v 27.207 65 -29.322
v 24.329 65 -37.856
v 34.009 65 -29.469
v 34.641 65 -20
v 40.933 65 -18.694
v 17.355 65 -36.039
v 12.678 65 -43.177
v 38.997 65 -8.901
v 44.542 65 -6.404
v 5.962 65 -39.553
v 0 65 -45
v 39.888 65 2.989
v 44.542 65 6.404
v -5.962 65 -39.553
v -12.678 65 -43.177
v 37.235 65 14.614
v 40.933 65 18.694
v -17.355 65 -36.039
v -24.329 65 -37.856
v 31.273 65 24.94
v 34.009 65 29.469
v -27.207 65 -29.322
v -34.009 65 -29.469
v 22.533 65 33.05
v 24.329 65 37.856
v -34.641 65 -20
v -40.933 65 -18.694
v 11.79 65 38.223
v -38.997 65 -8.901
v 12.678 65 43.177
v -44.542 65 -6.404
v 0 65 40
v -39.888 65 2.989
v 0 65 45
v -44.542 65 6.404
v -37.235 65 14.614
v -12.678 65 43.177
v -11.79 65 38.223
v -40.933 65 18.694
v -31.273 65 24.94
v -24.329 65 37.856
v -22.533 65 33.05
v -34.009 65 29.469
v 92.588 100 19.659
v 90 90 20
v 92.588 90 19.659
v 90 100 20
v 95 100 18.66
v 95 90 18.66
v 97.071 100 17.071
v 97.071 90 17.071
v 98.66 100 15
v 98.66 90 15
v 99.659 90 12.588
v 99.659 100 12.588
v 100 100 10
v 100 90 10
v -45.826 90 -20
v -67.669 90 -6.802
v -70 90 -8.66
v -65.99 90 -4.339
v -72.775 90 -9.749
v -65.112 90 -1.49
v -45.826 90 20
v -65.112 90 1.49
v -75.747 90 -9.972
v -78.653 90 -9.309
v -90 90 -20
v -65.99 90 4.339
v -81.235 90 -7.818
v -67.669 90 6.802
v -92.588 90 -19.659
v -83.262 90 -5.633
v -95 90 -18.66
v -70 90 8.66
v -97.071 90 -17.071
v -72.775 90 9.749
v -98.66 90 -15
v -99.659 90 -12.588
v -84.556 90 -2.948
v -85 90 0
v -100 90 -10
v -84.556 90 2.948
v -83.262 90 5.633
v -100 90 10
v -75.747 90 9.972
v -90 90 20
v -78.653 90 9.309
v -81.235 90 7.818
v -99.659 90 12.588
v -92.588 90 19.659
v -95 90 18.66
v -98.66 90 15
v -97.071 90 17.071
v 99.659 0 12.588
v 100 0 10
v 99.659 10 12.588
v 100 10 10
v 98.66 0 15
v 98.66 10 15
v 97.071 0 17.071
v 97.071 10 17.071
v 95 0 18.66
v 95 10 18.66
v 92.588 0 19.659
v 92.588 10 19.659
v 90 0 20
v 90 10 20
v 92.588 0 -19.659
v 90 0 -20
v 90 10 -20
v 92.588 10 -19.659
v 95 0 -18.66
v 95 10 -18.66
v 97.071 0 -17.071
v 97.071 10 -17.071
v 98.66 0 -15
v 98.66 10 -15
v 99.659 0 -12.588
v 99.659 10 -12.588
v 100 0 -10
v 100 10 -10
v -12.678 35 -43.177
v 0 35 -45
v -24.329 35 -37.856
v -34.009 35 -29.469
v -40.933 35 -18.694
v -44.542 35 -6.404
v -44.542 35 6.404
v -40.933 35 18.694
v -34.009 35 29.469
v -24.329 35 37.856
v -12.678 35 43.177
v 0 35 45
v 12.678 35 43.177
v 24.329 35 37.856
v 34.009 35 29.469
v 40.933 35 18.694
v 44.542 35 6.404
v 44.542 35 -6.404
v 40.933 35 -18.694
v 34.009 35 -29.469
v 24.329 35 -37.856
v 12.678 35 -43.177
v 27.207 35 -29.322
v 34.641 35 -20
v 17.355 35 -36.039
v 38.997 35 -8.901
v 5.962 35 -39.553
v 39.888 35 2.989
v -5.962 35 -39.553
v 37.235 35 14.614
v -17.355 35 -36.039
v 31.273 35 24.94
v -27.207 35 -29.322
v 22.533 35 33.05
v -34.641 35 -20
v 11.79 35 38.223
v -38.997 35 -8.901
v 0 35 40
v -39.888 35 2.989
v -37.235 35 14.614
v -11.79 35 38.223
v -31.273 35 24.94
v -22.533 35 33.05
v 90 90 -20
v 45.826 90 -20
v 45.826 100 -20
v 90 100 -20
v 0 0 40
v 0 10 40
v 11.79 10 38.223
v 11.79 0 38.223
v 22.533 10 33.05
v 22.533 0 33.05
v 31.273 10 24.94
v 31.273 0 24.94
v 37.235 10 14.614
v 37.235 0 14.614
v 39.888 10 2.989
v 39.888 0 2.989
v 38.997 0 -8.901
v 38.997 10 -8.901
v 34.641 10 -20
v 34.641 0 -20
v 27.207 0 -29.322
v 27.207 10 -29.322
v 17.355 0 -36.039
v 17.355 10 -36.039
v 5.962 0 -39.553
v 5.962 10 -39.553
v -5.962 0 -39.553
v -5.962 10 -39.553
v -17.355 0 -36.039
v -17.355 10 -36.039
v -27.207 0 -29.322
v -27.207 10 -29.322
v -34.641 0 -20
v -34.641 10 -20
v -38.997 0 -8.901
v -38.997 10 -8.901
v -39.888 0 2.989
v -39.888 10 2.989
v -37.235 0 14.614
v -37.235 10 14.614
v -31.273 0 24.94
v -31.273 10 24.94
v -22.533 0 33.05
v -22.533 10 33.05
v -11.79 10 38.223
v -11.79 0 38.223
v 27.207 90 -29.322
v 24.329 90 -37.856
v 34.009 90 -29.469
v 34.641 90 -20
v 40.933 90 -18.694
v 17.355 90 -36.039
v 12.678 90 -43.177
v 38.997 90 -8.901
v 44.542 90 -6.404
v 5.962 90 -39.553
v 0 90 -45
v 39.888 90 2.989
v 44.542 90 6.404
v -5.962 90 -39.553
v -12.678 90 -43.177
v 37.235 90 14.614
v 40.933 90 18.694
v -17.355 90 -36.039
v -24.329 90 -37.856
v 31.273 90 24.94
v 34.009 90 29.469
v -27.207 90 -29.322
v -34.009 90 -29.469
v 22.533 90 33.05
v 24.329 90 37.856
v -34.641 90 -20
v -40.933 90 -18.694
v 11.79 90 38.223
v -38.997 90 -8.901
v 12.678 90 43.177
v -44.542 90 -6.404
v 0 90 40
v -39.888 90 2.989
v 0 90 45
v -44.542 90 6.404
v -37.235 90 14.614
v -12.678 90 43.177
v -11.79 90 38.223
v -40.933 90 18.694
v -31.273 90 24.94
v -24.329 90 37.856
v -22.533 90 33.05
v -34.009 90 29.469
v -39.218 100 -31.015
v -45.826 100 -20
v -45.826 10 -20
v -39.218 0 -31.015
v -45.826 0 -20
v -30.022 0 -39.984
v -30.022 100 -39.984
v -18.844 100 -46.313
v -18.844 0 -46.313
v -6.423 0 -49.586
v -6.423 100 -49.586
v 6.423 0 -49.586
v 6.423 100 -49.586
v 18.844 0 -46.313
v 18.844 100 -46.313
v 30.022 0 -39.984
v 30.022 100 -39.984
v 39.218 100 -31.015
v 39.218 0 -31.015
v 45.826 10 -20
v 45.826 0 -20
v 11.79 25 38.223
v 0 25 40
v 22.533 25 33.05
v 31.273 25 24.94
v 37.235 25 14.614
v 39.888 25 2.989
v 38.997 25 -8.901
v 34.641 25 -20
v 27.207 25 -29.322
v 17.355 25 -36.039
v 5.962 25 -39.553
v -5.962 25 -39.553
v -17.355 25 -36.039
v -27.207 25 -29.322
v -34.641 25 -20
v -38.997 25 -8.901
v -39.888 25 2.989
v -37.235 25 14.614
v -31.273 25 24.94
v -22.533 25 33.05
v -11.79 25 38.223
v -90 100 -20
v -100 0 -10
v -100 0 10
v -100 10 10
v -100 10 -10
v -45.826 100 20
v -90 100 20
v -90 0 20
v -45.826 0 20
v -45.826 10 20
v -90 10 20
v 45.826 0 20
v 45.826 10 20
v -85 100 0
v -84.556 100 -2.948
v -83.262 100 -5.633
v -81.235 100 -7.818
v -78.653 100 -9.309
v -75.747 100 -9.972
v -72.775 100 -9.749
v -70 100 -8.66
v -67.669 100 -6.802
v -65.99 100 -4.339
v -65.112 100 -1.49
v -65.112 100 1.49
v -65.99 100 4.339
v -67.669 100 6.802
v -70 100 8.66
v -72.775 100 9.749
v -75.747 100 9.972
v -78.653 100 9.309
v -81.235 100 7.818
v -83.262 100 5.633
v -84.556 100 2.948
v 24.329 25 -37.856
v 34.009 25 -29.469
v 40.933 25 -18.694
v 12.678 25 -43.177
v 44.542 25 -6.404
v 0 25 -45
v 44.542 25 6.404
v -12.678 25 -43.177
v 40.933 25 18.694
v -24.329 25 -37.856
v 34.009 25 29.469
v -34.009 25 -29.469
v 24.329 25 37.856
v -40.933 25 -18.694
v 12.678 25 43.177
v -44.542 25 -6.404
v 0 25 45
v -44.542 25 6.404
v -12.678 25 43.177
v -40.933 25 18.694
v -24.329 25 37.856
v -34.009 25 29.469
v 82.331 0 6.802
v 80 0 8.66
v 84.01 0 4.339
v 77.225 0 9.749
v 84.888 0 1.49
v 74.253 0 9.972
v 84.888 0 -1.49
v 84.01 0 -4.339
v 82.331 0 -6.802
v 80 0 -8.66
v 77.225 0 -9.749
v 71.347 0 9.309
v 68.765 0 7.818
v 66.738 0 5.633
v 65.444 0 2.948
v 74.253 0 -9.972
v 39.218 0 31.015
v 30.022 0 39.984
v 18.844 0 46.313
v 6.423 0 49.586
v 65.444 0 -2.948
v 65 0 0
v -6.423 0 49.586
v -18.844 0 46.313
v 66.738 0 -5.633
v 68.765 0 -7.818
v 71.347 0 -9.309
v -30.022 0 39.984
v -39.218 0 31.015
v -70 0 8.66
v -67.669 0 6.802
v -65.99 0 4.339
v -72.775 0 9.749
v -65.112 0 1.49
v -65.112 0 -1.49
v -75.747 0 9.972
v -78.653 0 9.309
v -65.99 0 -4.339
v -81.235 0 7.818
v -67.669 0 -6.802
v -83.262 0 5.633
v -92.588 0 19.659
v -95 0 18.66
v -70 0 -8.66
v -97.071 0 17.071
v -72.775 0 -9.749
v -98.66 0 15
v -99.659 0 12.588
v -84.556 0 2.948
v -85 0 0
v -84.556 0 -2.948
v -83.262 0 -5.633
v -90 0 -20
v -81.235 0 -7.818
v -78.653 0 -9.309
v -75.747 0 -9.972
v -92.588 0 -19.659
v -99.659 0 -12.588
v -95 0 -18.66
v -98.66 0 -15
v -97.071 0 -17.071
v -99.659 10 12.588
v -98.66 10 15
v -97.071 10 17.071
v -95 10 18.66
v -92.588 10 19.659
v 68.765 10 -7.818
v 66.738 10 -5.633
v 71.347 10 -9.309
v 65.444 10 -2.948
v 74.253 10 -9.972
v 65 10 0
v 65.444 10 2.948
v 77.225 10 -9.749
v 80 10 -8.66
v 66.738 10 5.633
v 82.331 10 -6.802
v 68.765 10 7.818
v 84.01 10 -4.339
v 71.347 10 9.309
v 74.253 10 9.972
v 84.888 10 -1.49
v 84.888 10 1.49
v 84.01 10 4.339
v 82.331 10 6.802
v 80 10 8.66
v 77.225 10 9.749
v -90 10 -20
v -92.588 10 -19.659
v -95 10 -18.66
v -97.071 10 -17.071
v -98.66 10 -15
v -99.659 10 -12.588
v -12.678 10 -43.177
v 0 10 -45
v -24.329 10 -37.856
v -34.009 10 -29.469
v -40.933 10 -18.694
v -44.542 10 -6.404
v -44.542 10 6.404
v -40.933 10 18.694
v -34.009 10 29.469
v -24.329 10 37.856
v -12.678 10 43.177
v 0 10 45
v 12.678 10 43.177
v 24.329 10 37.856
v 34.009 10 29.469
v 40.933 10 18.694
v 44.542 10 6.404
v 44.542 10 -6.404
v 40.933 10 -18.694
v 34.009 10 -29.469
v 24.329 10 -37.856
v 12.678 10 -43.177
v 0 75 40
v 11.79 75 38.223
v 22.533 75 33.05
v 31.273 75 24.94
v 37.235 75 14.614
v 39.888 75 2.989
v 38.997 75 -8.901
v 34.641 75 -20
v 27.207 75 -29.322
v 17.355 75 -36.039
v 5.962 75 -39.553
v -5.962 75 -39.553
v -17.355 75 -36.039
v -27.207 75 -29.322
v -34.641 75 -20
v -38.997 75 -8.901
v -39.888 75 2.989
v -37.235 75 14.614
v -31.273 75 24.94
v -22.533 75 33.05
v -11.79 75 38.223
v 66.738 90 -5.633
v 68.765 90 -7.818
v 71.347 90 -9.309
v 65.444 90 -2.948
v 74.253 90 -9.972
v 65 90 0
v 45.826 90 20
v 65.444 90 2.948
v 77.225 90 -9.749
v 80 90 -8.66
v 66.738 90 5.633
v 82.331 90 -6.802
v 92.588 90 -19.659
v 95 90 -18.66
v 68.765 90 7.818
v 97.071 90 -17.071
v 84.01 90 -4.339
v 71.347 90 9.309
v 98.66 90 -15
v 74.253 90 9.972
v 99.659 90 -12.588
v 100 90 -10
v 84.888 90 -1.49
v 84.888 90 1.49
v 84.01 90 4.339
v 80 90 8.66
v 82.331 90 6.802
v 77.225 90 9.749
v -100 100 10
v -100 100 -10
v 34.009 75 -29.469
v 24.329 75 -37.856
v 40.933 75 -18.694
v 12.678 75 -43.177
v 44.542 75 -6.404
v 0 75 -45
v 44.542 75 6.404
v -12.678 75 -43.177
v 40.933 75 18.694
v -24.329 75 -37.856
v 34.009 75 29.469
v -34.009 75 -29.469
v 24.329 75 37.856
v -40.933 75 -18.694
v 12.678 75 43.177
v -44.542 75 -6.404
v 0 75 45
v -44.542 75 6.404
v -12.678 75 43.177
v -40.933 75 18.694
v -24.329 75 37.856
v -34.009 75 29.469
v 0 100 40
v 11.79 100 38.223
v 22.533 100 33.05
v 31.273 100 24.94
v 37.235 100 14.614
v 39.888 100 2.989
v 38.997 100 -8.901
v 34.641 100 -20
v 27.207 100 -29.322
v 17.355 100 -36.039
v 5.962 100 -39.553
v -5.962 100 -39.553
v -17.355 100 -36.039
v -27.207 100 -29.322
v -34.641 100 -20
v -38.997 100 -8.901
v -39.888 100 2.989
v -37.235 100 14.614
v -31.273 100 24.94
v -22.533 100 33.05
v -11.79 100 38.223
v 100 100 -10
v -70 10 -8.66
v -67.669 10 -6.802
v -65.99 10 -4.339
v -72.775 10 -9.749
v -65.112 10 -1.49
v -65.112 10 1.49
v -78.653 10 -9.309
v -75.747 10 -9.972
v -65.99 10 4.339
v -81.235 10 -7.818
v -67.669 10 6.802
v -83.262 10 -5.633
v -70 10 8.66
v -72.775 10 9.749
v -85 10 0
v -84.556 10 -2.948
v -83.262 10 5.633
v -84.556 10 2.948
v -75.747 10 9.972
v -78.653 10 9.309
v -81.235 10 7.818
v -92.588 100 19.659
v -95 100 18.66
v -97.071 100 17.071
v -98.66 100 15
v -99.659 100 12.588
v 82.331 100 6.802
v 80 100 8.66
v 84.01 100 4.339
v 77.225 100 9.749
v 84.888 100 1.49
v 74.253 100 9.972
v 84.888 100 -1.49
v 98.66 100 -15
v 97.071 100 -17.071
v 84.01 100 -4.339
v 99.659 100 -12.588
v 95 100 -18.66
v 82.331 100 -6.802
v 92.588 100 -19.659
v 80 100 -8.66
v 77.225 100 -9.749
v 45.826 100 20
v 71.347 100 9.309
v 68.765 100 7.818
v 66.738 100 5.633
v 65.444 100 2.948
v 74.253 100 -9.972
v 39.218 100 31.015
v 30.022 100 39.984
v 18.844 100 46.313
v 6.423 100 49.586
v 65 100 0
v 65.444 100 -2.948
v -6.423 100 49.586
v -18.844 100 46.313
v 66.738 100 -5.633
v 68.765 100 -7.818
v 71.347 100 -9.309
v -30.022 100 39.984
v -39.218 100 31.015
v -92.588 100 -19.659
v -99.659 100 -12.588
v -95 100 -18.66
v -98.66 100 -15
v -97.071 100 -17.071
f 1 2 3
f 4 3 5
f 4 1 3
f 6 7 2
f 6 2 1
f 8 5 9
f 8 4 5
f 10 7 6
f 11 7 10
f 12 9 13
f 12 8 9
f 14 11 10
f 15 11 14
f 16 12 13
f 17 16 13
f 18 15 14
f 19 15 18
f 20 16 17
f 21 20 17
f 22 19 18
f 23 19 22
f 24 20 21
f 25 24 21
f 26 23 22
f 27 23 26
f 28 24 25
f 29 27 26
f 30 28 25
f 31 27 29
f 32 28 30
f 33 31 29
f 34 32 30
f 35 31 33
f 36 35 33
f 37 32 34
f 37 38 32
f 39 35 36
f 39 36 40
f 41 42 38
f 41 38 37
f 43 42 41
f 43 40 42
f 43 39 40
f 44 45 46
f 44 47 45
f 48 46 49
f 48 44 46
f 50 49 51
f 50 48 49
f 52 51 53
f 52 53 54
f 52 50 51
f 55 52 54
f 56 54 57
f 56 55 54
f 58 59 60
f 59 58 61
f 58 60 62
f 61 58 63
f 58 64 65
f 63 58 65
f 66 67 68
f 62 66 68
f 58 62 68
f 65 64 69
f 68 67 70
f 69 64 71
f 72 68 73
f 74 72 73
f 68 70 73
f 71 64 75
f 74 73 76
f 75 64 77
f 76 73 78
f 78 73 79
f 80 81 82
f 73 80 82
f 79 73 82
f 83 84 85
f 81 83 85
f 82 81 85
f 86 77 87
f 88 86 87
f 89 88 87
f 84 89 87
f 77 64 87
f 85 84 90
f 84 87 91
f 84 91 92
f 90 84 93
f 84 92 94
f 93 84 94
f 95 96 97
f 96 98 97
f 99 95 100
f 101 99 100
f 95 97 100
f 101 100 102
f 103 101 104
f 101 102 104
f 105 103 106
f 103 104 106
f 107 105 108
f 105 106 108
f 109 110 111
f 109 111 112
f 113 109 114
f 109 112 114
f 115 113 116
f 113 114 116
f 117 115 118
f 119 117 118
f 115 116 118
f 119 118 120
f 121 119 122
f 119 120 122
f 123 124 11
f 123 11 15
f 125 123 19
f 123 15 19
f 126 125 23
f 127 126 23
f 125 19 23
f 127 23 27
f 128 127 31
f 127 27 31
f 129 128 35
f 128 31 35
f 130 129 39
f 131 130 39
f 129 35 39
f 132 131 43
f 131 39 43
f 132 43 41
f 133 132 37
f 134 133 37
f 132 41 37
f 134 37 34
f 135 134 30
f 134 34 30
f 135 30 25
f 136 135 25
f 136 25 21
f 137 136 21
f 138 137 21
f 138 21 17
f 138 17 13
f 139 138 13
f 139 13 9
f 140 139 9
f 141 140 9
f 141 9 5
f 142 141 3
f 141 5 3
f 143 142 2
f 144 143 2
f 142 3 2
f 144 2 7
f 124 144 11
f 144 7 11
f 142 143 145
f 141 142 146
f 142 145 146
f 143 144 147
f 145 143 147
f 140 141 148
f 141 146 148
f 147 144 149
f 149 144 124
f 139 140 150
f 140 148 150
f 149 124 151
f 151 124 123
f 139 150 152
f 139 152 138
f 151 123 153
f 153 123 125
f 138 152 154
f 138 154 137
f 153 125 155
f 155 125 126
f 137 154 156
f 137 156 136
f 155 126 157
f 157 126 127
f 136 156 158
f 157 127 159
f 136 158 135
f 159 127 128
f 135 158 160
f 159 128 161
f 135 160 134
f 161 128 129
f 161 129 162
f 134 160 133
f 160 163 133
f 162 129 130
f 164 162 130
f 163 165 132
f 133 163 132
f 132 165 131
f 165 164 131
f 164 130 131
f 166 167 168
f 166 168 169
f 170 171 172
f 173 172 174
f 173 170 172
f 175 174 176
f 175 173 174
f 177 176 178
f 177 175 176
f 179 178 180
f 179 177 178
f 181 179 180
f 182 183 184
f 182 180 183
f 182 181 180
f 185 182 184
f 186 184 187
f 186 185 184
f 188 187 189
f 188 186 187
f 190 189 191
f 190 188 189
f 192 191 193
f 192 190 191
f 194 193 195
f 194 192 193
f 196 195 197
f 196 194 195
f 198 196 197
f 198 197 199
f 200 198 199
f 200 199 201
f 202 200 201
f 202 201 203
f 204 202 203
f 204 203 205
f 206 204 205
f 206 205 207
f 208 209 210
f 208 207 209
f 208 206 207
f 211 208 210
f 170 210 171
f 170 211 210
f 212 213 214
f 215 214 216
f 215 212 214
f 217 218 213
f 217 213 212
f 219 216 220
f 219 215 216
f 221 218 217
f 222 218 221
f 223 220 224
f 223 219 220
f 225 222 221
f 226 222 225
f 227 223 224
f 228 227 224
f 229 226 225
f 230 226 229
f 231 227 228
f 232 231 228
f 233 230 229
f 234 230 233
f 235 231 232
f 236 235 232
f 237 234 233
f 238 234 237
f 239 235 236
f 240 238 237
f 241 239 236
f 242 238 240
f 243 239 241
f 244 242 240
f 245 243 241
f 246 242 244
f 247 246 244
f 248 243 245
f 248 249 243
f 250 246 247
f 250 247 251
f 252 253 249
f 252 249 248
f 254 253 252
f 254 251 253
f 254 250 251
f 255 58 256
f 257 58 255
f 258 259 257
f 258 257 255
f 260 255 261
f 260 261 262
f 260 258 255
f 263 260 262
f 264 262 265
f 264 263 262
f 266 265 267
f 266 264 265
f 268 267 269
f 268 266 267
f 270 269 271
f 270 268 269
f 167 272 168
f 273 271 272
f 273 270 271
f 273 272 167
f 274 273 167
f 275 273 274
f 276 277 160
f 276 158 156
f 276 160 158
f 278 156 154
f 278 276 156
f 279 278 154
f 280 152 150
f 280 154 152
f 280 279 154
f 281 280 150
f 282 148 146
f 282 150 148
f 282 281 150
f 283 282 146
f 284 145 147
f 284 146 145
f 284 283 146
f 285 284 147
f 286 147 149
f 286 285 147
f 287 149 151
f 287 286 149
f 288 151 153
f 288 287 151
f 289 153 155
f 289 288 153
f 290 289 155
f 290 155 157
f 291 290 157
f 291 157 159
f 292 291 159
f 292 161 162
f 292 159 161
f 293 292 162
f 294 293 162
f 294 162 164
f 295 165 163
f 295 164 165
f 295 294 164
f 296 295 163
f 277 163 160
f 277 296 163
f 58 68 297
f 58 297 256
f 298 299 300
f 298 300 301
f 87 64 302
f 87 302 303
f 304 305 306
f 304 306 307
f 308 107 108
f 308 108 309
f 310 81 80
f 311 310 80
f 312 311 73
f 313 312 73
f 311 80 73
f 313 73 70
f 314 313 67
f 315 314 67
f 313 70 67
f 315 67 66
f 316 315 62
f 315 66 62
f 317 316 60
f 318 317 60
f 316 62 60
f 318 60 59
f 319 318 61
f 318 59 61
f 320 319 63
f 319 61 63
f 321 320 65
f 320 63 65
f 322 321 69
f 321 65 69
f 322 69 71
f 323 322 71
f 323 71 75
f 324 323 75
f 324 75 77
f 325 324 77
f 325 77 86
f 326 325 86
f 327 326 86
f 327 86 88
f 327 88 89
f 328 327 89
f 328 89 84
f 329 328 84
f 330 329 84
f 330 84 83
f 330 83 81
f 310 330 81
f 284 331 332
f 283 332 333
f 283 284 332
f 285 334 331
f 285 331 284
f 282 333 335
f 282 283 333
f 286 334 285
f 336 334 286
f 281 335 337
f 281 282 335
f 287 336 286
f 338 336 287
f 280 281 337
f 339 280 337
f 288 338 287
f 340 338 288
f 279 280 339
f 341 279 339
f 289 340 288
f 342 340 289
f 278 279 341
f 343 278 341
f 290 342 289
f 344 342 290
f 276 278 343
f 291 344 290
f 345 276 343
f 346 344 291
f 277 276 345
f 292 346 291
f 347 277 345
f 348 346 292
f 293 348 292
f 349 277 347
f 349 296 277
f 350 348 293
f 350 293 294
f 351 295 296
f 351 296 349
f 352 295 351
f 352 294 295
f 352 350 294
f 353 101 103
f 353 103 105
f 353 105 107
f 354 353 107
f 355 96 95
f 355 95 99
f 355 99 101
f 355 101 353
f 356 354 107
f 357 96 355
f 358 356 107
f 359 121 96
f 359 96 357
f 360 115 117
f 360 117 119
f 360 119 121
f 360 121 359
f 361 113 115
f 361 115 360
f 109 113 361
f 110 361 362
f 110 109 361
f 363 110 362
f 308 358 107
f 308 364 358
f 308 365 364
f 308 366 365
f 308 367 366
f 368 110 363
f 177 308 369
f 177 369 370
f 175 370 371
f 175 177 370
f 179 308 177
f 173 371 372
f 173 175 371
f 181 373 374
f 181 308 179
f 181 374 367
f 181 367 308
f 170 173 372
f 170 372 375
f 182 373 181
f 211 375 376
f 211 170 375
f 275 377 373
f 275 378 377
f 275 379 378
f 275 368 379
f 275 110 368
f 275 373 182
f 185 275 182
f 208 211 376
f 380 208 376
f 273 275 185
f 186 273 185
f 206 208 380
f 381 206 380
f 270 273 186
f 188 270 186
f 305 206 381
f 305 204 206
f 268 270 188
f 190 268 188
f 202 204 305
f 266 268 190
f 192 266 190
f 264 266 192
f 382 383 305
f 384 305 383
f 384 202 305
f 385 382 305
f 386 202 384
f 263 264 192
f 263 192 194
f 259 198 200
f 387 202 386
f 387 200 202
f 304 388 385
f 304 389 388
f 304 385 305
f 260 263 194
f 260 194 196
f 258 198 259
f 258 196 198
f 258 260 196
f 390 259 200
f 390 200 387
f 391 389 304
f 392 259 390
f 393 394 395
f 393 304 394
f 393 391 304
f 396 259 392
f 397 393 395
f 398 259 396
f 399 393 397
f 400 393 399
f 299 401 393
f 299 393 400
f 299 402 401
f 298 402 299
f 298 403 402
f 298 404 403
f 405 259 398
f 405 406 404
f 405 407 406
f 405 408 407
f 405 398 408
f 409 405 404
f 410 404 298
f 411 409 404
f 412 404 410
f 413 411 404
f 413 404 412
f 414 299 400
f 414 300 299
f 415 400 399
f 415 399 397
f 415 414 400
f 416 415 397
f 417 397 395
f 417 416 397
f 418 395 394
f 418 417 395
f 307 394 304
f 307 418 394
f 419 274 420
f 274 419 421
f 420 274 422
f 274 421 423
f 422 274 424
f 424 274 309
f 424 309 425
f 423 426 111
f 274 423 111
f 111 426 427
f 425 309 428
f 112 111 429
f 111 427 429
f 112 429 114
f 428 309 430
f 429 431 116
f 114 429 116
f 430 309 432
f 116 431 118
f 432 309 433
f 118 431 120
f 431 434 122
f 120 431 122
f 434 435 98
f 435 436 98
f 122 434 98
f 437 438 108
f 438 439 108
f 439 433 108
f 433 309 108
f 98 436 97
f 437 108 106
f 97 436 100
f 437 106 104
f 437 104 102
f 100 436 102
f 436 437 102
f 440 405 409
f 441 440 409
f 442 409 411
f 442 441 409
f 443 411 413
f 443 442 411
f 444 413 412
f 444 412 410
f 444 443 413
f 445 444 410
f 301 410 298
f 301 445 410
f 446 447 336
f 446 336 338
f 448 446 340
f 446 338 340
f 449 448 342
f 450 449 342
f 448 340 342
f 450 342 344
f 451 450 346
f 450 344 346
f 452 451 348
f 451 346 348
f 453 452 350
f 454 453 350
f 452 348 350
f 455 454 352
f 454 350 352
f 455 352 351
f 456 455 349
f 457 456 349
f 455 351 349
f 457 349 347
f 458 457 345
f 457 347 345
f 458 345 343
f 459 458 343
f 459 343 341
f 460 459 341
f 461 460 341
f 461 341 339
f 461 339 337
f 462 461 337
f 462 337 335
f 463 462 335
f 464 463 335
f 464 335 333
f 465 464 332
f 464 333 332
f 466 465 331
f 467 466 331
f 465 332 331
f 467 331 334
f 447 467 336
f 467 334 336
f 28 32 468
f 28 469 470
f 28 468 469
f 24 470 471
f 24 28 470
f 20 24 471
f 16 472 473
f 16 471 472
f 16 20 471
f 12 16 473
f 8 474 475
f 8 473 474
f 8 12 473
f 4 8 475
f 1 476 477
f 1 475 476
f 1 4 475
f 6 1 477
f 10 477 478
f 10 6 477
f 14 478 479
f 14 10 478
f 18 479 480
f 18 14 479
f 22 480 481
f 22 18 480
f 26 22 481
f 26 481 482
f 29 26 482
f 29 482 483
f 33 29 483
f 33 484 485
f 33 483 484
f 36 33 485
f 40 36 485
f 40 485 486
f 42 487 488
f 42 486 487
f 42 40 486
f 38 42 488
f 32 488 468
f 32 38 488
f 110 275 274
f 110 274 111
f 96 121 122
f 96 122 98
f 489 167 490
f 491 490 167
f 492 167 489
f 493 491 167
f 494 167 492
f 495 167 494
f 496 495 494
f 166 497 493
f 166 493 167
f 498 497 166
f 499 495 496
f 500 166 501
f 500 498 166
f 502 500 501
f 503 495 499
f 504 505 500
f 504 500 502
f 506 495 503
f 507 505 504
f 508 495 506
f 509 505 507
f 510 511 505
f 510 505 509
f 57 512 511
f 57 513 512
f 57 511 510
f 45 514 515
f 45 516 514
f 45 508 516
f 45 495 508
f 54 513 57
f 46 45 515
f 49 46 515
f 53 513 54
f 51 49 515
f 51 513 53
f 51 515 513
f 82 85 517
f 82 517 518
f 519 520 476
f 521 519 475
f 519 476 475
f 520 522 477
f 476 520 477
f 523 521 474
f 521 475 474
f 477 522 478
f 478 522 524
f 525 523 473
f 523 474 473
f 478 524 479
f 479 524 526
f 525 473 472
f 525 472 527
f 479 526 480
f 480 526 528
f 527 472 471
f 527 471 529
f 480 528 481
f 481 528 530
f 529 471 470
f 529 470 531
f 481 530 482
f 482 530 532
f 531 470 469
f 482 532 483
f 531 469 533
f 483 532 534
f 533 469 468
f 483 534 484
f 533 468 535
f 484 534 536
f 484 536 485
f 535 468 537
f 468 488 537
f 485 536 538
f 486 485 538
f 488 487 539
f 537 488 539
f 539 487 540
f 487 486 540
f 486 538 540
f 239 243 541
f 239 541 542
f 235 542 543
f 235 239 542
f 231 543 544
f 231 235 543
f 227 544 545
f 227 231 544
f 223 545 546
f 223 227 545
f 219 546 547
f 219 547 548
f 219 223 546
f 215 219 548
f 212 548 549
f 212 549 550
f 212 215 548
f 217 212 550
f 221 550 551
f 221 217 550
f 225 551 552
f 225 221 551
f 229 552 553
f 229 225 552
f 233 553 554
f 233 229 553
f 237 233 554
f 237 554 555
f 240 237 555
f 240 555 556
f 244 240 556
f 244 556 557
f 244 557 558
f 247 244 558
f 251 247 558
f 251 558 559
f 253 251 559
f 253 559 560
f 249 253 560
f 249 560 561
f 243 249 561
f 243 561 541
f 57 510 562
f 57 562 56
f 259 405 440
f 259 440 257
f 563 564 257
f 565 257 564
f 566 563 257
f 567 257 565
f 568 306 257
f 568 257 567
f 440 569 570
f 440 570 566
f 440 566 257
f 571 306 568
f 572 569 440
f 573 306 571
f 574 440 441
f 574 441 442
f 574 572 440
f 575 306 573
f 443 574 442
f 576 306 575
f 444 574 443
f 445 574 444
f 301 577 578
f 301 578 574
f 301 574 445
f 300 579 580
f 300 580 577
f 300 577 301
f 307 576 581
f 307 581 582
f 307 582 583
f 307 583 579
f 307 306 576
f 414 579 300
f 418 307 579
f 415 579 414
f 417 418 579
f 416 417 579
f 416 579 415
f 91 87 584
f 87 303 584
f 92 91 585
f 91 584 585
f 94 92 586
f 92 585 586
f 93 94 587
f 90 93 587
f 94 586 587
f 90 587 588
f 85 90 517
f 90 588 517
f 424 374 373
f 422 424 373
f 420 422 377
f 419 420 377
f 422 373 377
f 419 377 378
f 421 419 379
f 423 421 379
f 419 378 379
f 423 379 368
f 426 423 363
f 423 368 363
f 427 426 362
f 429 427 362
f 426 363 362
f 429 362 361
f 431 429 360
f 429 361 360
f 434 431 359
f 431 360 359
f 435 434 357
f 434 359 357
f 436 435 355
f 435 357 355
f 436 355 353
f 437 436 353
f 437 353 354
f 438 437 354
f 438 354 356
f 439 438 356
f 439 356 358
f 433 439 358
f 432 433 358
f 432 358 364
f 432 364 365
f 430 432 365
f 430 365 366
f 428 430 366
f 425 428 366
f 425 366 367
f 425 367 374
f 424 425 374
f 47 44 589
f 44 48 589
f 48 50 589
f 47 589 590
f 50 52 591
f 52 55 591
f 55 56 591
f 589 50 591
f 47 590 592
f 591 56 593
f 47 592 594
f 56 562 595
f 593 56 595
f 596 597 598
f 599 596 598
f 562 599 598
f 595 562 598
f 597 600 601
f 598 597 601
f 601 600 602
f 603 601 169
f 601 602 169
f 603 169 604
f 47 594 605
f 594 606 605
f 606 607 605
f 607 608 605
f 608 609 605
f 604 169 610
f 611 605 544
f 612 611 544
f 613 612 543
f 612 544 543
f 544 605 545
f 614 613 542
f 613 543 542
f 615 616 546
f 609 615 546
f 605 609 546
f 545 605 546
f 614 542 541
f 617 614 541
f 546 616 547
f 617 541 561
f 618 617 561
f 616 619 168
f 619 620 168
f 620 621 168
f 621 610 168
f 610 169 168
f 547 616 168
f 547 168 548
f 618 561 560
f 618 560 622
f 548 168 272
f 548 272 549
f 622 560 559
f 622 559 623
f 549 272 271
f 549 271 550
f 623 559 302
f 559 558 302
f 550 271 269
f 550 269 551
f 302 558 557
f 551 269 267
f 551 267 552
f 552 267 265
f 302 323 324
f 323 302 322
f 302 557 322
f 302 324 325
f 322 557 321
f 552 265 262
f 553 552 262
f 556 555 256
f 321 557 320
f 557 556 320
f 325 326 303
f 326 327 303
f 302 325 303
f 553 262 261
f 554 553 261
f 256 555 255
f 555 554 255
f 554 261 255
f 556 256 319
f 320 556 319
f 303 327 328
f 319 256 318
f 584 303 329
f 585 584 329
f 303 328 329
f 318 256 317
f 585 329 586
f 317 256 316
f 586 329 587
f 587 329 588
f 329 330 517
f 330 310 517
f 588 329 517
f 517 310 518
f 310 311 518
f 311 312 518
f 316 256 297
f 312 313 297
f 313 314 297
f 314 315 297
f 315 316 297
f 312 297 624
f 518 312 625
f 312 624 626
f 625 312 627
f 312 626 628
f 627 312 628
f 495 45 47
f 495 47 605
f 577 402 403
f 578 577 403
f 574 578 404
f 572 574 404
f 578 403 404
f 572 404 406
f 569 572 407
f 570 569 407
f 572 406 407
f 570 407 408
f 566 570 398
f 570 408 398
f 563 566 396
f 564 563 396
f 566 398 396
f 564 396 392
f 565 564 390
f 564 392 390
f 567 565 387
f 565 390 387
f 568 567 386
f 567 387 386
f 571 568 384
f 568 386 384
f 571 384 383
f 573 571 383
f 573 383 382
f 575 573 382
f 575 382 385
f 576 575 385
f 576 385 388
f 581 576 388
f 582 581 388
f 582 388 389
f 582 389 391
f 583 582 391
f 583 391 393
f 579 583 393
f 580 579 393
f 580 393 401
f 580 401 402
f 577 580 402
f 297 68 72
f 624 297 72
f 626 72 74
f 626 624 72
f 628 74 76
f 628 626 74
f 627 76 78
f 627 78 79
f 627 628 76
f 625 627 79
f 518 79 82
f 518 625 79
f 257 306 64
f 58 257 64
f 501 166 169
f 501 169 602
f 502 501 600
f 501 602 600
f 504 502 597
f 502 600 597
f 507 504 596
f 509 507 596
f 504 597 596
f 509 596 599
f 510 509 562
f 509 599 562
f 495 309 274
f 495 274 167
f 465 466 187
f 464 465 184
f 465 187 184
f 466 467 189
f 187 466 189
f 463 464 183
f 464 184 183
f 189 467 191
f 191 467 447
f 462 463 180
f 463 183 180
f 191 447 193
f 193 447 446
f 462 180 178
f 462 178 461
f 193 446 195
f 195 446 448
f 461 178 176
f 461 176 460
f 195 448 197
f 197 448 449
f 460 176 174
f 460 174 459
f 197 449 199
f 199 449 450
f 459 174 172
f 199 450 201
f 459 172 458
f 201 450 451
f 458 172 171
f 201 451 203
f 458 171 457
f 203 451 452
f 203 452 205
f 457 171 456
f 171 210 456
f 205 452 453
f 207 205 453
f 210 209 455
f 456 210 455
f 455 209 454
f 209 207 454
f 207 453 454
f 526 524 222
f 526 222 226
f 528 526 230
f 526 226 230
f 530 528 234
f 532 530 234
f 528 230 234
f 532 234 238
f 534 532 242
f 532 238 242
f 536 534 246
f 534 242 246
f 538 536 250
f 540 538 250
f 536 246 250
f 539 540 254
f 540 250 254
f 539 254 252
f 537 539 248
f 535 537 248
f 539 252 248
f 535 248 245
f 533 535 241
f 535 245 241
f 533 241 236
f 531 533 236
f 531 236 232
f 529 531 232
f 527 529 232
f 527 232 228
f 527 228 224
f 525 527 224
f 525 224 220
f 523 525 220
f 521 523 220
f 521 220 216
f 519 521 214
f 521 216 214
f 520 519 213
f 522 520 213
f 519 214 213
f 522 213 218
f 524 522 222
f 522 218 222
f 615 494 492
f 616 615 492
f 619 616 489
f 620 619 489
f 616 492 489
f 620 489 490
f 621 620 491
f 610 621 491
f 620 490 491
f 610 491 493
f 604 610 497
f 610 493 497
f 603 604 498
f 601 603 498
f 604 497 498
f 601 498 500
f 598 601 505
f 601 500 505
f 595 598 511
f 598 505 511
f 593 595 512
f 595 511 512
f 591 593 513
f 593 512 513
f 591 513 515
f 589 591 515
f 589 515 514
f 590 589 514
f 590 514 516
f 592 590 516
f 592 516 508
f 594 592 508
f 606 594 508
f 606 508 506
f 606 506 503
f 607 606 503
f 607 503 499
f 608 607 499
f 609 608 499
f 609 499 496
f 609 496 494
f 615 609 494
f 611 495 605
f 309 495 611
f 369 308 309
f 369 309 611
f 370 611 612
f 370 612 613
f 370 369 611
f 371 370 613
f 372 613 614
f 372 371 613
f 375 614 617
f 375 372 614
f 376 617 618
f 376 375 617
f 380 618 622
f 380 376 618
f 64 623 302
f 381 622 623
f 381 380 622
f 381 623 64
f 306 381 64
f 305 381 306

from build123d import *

# Parameters (mm, degrees)
SKETCH1_R           = 40
BOSS_EXTRUDE1_DEPTH = 100
SKETCH3_W           = 54.17424305
SKETCH3_H           = 80
CUT_EXTRUDE1_DEPTH  = 158.797338381
HOLE1_D             = 20
FILLET1_R           = 10
SKETCH6_W           = 45
SKETCH6_H           = 15
SKETCH6_H_2         = 30


with BuildPart() as part:
    # Sketch1 → Boss-Extrude1 (new body)
    with BuildSketch(Plane(origin=(0, 0, 0), x_dir=(1, 0, 0), z_dir=(0, 1, 0))):
        with BuildLine():
            Line((45.82575695, 20), (100, 20))
            Line((100, 20), (100, -20))
            Line((100, -20), (45.82575695, -20))
            ThreePointArc((45.82575695, -20), (0, -50), (-45.82575695, -20))
            Line((-45.82575695, -20), (-100, -20))
            Line((-100, -20), (-100, 20))
            Line((-100, 20), (-45.82575695, 20))
            ThreePointArc((-45.82575695, 20), (0, 50), (45.82575695, 20))
        make_face()
        with Locations(Location((0, 0, 0), (0, 0, 270))):
            Circle(SKETCH1_R, mode=Mode.SUBTRACT)
    extrude(amount=BOSS_EXTRUDE1_DEPTH)

    # Sketch3 → Cut-Extrude1 (cut, symmetric)
    with BuildSketch(Plane.XY.offset(20)):
        with Locations((72.912878475, 50)):
            Rectangle(SKETCH3_W, SKETCH3_H)
    cut_extrude1 = extrude(amount=CUT_EXTRUDE1_DEPTH, both=True, mode=Mode.SUBTRACT)

    # Mirror1: Cut-Extrude1 across plane
    add(cut_extrude1.mirror(Plane(origin=(0, 0, 0), x_dir=(0, 0, 1), z_dir=(1, 0, 0))), mode=Mode.SUBTRACT)

    # Hole1 (through all)
    with Locations(Plane(origin=(0, 100, 0), x_dir=(1, 0, 0), z_dir=(0, 1, 0))):
        with Locations((-75, 0), (75, 0)):
            Hole(HOLE1_D / 2)

    # Fillet1
    fillet1_edges = [part.edges().sort_by_distance(p)[0] for p in [
        (100, 95, 20),
        (-100, 95, 20),
        (-100, 95, -20),
        (100, 95, -20),
        (100, 5, 20),
        (100, 5, -20),
        (-100, 5, 20),
        (-100, 5, -20),
    ]]
    fillet(fillet1_edges, radius=FILLET1_R)

    # Sketch6 → Cut-Revolve1 (revolve, cut)
    with BuildSketch(Plane.XY, mode=Mode.PRIVATE) as cut_revolve1_sk:
        with Locations((22.5, 82.5)):
            Rectangle(SKETCH6_W, SKETCH6_H)
        with Locations((22.5, 50)):
            Rectangle(SKETCH6_W, SKETCH6_H_2)
        with Locations((22.5, 17.5)):
            Rectangle(SKETCH6_W, SKETCH6_H)
    revolve(cut_revolve1_sk.sketch.rotate(Axis((0, 0, 0), (0, 1, 0)), 90), axis=Axis((0, 0, 0), (0, 1, 0)), mode=Mode.SUBTRACT)


solid = part.part
